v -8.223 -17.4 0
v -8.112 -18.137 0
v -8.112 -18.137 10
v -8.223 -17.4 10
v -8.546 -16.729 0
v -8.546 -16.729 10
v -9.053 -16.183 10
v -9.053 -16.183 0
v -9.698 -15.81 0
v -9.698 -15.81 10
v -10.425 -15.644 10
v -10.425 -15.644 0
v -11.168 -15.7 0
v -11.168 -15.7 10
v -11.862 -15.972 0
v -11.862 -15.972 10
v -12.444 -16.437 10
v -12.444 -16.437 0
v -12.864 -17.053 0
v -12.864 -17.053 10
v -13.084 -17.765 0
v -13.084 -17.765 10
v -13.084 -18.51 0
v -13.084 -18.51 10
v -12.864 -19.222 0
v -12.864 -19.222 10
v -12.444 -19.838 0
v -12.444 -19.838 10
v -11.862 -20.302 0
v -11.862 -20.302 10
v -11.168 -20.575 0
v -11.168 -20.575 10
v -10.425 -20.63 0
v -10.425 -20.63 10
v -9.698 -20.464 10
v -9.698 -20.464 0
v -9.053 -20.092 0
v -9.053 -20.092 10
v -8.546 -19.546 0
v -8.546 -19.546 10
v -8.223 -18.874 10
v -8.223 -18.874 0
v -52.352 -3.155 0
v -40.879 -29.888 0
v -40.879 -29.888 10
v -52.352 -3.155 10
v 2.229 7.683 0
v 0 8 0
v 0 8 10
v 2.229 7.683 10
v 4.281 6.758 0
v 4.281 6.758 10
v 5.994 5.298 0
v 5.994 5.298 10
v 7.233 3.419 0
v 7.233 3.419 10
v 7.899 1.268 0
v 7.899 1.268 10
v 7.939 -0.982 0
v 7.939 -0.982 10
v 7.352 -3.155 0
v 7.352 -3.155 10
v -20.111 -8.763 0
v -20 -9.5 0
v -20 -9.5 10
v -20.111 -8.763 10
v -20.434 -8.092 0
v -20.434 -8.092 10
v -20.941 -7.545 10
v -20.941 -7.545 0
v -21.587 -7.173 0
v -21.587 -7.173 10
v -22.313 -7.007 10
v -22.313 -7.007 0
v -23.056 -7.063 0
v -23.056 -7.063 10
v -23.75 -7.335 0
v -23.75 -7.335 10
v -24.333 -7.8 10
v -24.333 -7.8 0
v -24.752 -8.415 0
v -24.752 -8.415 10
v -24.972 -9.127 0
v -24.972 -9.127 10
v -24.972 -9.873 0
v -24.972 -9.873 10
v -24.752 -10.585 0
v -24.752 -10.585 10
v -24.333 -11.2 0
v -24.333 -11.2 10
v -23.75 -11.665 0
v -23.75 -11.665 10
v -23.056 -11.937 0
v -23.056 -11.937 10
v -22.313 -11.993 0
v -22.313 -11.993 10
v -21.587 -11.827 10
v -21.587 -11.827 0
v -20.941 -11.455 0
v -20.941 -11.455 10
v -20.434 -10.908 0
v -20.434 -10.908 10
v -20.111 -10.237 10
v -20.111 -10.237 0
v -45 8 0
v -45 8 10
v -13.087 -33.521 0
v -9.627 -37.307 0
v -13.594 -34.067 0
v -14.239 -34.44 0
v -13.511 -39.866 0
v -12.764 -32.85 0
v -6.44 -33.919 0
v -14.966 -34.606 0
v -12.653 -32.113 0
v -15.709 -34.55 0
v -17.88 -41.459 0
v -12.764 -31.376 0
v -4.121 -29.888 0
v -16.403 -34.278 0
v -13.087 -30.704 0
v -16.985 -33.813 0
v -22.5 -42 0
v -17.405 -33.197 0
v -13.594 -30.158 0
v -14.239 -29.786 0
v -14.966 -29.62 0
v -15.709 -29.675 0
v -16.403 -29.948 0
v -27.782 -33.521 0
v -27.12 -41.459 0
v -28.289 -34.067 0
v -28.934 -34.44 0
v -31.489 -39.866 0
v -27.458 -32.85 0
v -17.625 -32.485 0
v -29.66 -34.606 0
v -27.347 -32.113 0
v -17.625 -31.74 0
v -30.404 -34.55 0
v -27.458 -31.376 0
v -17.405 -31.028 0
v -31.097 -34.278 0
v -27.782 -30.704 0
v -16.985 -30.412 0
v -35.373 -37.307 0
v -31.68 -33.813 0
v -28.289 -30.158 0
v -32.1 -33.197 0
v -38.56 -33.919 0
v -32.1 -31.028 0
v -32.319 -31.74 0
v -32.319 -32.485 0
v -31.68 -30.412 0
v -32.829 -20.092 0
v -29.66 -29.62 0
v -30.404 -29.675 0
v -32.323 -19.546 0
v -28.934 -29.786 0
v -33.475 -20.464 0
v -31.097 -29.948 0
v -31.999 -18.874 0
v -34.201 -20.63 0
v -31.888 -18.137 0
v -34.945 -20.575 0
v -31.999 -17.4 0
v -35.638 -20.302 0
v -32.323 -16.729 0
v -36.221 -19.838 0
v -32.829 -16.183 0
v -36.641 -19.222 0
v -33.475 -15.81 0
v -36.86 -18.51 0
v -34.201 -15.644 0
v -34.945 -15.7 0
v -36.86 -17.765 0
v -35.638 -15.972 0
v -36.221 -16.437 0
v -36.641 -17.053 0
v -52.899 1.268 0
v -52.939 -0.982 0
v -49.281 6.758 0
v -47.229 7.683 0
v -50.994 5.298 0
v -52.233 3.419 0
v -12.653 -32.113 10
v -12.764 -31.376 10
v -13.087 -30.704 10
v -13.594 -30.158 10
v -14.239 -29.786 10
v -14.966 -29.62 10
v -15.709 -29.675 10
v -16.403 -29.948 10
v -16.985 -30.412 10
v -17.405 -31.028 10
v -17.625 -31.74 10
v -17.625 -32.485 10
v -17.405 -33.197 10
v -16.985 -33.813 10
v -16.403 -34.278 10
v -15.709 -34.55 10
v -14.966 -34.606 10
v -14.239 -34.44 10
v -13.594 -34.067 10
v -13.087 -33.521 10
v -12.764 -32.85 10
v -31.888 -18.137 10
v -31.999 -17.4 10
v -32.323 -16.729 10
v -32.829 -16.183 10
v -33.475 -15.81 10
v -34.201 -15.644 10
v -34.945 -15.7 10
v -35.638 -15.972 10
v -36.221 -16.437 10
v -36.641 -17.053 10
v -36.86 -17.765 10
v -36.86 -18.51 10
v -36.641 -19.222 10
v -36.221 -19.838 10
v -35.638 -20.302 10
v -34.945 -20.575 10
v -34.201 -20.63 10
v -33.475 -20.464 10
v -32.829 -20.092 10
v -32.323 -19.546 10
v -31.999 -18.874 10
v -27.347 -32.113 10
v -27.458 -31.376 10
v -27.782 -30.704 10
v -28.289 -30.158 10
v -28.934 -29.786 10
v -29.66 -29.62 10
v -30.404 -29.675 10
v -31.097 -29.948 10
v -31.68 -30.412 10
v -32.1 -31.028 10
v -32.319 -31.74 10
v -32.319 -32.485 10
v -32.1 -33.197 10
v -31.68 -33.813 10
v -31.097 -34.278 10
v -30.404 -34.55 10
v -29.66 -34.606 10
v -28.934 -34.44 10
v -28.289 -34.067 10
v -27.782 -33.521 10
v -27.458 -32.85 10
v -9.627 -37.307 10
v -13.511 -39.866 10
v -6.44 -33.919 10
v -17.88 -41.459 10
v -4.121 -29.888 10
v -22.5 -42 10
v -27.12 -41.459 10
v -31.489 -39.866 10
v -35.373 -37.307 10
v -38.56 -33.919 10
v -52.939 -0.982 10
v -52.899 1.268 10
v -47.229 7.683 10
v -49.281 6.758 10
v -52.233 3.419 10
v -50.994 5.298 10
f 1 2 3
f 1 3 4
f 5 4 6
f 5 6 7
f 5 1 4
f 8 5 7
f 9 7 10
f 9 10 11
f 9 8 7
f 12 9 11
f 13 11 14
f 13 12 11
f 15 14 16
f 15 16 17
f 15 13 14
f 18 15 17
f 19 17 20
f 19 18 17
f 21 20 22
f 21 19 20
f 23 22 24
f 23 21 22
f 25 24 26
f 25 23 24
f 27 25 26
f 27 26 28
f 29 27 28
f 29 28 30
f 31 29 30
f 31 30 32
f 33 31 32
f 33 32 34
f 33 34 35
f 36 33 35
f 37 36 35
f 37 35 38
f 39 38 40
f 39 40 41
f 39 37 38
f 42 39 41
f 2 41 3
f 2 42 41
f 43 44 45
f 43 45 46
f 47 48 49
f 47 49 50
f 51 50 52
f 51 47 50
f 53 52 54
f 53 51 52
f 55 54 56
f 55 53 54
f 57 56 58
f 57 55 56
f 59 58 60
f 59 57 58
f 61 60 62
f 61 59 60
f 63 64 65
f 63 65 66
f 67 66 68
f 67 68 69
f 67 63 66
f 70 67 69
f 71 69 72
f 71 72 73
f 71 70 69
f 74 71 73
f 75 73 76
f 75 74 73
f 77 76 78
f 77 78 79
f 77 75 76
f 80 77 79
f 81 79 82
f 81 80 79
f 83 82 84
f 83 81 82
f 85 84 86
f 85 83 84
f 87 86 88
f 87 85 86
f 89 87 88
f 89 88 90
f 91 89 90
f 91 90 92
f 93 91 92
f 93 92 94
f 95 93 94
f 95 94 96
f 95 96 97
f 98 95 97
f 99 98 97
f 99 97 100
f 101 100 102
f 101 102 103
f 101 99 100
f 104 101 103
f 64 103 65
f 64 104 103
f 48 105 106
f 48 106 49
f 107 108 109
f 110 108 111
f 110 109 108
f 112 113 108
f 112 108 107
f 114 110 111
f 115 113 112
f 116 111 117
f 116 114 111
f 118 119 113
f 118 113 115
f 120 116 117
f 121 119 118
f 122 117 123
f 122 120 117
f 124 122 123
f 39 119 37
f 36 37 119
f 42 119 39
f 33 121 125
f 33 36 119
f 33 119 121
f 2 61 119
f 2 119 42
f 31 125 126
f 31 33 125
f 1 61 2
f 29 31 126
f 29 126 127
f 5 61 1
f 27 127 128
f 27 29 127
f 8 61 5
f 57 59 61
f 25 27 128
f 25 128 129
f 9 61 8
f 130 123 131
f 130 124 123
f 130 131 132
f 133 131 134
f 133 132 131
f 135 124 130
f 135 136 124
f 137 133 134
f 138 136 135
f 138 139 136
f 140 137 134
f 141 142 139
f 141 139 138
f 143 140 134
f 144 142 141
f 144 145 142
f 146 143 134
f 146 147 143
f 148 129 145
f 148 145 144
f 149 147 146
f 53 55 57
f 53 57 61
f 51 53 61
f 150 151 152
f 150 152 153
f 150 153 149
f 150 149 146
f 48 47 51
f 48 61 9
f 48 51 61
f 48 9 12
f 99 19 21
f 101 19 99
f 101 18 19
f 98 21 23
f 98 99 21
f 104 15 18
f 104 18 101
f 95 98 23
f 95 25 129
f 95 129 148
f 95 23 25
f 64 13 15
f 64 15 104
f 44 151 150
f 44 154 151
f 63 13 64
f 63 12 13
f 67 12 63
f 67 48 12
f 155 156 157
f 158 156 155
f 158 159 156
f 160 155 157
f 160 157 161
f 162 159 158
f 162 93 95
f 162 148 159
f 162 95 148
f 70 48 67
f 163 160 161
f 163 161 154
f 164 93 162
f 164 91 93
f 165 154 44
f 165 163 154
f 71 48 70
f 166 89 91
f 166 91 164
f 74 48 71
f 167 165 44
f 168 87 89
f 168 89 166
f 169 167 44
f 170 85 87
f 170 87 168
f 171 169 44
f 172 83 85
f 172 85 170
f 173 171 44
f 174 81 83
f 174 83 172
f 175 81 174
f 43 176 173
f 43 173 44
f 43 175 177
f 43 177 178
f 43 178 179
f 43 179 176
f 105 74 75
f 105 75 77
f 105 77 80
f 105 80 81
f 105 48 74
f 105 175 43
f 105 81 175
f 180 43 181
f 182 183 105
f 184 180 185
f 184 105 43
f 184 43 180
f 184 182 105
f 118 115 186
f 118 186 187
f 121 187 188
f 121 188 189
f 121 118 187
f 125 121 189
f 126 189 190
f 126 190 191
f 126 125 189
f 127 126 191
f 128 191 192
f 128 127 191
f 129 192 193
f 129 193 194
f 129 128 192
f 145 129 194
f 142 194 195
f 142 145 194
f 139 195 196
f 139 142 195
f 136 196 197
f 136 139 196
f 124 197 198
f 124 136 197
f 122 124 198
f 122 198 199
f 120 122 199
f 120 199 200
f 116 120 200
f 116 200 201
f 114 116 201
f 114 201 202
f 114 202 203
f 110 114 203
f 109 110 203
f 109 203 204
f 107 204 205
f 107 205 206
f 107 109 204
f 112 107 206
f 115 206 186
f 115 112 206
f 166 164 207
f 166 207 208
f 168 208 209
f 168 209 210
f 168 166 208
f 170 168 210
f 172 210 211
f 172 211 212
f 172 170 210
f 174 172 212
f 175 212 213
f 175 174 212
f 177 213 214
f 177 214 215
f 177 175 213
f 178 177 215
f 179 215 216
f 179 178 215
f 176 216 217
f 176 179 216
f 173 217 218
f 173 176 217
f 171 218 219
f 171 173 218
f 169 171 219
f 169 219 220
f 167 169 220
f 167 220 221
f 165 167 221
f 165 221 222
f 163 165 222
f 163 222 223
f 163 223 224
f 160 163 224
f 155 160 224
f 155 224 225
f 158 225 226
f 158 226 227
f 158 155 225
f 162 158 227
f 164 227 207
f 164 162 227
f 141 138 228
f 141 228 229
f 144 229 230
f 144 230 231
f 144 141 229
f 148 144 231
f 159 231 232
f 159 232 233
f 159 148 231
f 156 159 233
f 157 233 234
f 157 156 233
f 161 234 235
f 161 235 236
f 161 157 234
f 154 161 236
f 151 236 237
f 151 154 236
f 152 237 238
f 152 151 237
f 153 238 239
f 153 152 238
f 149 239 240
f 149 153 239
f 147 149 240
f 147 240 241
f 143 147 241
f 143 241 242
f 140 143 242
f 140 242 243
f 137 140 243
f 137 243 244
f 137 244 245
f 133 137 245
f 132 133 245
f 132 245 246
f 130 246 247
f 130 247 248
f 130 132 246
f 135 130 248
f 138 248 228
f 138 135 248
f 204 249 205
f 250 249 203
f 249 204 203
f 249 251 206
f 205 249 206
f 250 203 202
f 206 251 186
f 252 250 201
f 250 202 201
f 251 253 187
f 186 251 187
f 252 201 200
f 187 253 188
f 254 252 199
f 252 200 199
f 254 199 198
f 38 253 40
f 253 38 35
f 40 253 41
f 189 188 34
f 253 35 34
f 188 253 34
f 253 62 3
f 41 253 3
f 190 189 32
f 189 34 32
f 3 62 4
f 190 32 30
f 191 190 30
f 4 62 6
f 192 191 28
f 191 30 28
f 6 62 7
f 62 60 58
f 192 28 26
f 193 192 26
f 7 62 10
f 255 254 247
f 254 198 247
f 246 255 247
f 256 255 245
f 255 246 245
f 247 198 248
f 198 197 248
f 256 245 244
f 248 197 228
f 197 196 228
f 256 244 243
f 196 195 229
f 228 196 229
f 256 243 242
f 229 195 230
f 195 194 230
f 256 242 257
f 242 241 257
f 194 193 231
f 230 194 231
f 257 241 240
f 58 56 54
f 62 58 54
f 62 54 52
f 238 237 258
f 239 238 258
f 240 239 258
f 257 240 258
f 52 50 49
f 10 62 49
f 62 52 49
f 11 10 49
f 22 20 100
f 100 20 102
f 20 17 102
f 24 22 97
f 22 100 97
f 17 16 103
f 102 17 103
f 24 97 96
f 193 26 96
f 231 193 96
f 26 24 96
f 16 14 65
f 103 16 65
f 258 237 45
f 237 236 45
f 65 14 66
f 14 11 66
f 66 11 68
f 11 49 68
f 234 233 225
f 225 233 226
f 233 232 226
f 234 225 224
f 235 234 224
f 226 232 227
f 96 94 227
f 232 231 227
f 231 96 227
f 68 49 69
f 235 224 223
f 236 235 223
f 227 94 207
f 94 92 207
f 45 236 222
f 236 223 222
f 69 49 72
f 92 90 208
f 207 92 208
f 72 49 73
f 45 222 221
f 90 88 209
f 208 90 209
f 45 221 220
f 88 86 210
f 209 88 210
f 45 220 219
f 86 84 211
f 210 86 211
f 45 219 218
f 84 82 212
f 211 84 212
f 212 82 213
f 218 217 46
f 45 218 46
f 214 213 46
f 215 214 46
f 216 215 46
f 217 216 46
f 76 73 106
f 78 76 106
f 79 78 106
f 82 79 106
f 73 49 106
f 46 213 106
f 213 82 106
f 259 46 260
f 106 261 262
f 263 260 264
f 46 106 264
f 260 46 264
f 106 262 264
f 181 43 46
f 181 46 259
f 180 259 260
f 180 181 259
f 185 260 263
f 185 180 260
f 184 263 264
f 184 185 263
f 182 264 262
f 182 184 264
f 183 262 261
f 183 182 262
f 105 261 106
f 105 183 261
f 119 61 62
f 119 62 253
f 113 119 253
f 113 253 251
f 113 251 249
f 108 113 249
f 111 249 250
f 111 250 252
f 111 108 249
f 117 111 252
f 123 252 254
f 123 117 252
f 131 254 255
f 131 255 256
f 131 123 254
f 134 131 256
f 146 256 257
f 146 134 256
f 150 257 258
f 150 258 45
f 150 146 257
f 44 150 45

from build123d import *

# Parameters (mm, degrees)
CROQUIS1_R              = 2.5
SALIENTE_EXTRUIR1_DEPTH = 10


with BuildPart() as part:
    # Croquis1 → Saliente-Extruir1 (new body)
    with BuildSketch(Plane.XY):
        with BuildLine():
            Line((-45, 8), (0, 8))
            ThreePointArc((0, 8), (6.679829127, 4.402258834), (7.351584195, -3.15502929))
            Line((7.351584195, -3.15502929), (-4.121039512, -29.887573226))
            ThreePointArc((-4.121039512, -29.887573226), (-22.5, -42), (-40.878960488, -29.887573226))
            Line((-40.878960488, -29.887573226), (-52.351584195, -3.15502929))
            ThreePointArc((-52.351584195, -3.15502929), (-51.679829127, 4.402258834), (-45, 8))
        make_face()
        with Locations((-22.5, -9.5)):
            Circle(CROQUIS1_R, mode=Mode.SUBTRACT)
        with Locations((-10.611793546, -18.13728757)):
            Circle(CROQUIS1_R, mode=Mode.SUBTRACT)
        with Locations((-15.152684346, -32.11271243)):
            Circle(CROQUIS1_R, mode=Mode.SUBTRACT)
        with Locations((-29.847315654, -32.11271243)):
            Circle(CROQUIS1_R, mode=Mode.SUBTRACT)
        with Locations((-34.388206454, -18.13728757)):
            Circle(CROQUIS1_R, mode=Mode.SUBTRACT)
    extrude(amount=SALIENTE_EXTRUIR1_DEPTH)


solid = part.part
